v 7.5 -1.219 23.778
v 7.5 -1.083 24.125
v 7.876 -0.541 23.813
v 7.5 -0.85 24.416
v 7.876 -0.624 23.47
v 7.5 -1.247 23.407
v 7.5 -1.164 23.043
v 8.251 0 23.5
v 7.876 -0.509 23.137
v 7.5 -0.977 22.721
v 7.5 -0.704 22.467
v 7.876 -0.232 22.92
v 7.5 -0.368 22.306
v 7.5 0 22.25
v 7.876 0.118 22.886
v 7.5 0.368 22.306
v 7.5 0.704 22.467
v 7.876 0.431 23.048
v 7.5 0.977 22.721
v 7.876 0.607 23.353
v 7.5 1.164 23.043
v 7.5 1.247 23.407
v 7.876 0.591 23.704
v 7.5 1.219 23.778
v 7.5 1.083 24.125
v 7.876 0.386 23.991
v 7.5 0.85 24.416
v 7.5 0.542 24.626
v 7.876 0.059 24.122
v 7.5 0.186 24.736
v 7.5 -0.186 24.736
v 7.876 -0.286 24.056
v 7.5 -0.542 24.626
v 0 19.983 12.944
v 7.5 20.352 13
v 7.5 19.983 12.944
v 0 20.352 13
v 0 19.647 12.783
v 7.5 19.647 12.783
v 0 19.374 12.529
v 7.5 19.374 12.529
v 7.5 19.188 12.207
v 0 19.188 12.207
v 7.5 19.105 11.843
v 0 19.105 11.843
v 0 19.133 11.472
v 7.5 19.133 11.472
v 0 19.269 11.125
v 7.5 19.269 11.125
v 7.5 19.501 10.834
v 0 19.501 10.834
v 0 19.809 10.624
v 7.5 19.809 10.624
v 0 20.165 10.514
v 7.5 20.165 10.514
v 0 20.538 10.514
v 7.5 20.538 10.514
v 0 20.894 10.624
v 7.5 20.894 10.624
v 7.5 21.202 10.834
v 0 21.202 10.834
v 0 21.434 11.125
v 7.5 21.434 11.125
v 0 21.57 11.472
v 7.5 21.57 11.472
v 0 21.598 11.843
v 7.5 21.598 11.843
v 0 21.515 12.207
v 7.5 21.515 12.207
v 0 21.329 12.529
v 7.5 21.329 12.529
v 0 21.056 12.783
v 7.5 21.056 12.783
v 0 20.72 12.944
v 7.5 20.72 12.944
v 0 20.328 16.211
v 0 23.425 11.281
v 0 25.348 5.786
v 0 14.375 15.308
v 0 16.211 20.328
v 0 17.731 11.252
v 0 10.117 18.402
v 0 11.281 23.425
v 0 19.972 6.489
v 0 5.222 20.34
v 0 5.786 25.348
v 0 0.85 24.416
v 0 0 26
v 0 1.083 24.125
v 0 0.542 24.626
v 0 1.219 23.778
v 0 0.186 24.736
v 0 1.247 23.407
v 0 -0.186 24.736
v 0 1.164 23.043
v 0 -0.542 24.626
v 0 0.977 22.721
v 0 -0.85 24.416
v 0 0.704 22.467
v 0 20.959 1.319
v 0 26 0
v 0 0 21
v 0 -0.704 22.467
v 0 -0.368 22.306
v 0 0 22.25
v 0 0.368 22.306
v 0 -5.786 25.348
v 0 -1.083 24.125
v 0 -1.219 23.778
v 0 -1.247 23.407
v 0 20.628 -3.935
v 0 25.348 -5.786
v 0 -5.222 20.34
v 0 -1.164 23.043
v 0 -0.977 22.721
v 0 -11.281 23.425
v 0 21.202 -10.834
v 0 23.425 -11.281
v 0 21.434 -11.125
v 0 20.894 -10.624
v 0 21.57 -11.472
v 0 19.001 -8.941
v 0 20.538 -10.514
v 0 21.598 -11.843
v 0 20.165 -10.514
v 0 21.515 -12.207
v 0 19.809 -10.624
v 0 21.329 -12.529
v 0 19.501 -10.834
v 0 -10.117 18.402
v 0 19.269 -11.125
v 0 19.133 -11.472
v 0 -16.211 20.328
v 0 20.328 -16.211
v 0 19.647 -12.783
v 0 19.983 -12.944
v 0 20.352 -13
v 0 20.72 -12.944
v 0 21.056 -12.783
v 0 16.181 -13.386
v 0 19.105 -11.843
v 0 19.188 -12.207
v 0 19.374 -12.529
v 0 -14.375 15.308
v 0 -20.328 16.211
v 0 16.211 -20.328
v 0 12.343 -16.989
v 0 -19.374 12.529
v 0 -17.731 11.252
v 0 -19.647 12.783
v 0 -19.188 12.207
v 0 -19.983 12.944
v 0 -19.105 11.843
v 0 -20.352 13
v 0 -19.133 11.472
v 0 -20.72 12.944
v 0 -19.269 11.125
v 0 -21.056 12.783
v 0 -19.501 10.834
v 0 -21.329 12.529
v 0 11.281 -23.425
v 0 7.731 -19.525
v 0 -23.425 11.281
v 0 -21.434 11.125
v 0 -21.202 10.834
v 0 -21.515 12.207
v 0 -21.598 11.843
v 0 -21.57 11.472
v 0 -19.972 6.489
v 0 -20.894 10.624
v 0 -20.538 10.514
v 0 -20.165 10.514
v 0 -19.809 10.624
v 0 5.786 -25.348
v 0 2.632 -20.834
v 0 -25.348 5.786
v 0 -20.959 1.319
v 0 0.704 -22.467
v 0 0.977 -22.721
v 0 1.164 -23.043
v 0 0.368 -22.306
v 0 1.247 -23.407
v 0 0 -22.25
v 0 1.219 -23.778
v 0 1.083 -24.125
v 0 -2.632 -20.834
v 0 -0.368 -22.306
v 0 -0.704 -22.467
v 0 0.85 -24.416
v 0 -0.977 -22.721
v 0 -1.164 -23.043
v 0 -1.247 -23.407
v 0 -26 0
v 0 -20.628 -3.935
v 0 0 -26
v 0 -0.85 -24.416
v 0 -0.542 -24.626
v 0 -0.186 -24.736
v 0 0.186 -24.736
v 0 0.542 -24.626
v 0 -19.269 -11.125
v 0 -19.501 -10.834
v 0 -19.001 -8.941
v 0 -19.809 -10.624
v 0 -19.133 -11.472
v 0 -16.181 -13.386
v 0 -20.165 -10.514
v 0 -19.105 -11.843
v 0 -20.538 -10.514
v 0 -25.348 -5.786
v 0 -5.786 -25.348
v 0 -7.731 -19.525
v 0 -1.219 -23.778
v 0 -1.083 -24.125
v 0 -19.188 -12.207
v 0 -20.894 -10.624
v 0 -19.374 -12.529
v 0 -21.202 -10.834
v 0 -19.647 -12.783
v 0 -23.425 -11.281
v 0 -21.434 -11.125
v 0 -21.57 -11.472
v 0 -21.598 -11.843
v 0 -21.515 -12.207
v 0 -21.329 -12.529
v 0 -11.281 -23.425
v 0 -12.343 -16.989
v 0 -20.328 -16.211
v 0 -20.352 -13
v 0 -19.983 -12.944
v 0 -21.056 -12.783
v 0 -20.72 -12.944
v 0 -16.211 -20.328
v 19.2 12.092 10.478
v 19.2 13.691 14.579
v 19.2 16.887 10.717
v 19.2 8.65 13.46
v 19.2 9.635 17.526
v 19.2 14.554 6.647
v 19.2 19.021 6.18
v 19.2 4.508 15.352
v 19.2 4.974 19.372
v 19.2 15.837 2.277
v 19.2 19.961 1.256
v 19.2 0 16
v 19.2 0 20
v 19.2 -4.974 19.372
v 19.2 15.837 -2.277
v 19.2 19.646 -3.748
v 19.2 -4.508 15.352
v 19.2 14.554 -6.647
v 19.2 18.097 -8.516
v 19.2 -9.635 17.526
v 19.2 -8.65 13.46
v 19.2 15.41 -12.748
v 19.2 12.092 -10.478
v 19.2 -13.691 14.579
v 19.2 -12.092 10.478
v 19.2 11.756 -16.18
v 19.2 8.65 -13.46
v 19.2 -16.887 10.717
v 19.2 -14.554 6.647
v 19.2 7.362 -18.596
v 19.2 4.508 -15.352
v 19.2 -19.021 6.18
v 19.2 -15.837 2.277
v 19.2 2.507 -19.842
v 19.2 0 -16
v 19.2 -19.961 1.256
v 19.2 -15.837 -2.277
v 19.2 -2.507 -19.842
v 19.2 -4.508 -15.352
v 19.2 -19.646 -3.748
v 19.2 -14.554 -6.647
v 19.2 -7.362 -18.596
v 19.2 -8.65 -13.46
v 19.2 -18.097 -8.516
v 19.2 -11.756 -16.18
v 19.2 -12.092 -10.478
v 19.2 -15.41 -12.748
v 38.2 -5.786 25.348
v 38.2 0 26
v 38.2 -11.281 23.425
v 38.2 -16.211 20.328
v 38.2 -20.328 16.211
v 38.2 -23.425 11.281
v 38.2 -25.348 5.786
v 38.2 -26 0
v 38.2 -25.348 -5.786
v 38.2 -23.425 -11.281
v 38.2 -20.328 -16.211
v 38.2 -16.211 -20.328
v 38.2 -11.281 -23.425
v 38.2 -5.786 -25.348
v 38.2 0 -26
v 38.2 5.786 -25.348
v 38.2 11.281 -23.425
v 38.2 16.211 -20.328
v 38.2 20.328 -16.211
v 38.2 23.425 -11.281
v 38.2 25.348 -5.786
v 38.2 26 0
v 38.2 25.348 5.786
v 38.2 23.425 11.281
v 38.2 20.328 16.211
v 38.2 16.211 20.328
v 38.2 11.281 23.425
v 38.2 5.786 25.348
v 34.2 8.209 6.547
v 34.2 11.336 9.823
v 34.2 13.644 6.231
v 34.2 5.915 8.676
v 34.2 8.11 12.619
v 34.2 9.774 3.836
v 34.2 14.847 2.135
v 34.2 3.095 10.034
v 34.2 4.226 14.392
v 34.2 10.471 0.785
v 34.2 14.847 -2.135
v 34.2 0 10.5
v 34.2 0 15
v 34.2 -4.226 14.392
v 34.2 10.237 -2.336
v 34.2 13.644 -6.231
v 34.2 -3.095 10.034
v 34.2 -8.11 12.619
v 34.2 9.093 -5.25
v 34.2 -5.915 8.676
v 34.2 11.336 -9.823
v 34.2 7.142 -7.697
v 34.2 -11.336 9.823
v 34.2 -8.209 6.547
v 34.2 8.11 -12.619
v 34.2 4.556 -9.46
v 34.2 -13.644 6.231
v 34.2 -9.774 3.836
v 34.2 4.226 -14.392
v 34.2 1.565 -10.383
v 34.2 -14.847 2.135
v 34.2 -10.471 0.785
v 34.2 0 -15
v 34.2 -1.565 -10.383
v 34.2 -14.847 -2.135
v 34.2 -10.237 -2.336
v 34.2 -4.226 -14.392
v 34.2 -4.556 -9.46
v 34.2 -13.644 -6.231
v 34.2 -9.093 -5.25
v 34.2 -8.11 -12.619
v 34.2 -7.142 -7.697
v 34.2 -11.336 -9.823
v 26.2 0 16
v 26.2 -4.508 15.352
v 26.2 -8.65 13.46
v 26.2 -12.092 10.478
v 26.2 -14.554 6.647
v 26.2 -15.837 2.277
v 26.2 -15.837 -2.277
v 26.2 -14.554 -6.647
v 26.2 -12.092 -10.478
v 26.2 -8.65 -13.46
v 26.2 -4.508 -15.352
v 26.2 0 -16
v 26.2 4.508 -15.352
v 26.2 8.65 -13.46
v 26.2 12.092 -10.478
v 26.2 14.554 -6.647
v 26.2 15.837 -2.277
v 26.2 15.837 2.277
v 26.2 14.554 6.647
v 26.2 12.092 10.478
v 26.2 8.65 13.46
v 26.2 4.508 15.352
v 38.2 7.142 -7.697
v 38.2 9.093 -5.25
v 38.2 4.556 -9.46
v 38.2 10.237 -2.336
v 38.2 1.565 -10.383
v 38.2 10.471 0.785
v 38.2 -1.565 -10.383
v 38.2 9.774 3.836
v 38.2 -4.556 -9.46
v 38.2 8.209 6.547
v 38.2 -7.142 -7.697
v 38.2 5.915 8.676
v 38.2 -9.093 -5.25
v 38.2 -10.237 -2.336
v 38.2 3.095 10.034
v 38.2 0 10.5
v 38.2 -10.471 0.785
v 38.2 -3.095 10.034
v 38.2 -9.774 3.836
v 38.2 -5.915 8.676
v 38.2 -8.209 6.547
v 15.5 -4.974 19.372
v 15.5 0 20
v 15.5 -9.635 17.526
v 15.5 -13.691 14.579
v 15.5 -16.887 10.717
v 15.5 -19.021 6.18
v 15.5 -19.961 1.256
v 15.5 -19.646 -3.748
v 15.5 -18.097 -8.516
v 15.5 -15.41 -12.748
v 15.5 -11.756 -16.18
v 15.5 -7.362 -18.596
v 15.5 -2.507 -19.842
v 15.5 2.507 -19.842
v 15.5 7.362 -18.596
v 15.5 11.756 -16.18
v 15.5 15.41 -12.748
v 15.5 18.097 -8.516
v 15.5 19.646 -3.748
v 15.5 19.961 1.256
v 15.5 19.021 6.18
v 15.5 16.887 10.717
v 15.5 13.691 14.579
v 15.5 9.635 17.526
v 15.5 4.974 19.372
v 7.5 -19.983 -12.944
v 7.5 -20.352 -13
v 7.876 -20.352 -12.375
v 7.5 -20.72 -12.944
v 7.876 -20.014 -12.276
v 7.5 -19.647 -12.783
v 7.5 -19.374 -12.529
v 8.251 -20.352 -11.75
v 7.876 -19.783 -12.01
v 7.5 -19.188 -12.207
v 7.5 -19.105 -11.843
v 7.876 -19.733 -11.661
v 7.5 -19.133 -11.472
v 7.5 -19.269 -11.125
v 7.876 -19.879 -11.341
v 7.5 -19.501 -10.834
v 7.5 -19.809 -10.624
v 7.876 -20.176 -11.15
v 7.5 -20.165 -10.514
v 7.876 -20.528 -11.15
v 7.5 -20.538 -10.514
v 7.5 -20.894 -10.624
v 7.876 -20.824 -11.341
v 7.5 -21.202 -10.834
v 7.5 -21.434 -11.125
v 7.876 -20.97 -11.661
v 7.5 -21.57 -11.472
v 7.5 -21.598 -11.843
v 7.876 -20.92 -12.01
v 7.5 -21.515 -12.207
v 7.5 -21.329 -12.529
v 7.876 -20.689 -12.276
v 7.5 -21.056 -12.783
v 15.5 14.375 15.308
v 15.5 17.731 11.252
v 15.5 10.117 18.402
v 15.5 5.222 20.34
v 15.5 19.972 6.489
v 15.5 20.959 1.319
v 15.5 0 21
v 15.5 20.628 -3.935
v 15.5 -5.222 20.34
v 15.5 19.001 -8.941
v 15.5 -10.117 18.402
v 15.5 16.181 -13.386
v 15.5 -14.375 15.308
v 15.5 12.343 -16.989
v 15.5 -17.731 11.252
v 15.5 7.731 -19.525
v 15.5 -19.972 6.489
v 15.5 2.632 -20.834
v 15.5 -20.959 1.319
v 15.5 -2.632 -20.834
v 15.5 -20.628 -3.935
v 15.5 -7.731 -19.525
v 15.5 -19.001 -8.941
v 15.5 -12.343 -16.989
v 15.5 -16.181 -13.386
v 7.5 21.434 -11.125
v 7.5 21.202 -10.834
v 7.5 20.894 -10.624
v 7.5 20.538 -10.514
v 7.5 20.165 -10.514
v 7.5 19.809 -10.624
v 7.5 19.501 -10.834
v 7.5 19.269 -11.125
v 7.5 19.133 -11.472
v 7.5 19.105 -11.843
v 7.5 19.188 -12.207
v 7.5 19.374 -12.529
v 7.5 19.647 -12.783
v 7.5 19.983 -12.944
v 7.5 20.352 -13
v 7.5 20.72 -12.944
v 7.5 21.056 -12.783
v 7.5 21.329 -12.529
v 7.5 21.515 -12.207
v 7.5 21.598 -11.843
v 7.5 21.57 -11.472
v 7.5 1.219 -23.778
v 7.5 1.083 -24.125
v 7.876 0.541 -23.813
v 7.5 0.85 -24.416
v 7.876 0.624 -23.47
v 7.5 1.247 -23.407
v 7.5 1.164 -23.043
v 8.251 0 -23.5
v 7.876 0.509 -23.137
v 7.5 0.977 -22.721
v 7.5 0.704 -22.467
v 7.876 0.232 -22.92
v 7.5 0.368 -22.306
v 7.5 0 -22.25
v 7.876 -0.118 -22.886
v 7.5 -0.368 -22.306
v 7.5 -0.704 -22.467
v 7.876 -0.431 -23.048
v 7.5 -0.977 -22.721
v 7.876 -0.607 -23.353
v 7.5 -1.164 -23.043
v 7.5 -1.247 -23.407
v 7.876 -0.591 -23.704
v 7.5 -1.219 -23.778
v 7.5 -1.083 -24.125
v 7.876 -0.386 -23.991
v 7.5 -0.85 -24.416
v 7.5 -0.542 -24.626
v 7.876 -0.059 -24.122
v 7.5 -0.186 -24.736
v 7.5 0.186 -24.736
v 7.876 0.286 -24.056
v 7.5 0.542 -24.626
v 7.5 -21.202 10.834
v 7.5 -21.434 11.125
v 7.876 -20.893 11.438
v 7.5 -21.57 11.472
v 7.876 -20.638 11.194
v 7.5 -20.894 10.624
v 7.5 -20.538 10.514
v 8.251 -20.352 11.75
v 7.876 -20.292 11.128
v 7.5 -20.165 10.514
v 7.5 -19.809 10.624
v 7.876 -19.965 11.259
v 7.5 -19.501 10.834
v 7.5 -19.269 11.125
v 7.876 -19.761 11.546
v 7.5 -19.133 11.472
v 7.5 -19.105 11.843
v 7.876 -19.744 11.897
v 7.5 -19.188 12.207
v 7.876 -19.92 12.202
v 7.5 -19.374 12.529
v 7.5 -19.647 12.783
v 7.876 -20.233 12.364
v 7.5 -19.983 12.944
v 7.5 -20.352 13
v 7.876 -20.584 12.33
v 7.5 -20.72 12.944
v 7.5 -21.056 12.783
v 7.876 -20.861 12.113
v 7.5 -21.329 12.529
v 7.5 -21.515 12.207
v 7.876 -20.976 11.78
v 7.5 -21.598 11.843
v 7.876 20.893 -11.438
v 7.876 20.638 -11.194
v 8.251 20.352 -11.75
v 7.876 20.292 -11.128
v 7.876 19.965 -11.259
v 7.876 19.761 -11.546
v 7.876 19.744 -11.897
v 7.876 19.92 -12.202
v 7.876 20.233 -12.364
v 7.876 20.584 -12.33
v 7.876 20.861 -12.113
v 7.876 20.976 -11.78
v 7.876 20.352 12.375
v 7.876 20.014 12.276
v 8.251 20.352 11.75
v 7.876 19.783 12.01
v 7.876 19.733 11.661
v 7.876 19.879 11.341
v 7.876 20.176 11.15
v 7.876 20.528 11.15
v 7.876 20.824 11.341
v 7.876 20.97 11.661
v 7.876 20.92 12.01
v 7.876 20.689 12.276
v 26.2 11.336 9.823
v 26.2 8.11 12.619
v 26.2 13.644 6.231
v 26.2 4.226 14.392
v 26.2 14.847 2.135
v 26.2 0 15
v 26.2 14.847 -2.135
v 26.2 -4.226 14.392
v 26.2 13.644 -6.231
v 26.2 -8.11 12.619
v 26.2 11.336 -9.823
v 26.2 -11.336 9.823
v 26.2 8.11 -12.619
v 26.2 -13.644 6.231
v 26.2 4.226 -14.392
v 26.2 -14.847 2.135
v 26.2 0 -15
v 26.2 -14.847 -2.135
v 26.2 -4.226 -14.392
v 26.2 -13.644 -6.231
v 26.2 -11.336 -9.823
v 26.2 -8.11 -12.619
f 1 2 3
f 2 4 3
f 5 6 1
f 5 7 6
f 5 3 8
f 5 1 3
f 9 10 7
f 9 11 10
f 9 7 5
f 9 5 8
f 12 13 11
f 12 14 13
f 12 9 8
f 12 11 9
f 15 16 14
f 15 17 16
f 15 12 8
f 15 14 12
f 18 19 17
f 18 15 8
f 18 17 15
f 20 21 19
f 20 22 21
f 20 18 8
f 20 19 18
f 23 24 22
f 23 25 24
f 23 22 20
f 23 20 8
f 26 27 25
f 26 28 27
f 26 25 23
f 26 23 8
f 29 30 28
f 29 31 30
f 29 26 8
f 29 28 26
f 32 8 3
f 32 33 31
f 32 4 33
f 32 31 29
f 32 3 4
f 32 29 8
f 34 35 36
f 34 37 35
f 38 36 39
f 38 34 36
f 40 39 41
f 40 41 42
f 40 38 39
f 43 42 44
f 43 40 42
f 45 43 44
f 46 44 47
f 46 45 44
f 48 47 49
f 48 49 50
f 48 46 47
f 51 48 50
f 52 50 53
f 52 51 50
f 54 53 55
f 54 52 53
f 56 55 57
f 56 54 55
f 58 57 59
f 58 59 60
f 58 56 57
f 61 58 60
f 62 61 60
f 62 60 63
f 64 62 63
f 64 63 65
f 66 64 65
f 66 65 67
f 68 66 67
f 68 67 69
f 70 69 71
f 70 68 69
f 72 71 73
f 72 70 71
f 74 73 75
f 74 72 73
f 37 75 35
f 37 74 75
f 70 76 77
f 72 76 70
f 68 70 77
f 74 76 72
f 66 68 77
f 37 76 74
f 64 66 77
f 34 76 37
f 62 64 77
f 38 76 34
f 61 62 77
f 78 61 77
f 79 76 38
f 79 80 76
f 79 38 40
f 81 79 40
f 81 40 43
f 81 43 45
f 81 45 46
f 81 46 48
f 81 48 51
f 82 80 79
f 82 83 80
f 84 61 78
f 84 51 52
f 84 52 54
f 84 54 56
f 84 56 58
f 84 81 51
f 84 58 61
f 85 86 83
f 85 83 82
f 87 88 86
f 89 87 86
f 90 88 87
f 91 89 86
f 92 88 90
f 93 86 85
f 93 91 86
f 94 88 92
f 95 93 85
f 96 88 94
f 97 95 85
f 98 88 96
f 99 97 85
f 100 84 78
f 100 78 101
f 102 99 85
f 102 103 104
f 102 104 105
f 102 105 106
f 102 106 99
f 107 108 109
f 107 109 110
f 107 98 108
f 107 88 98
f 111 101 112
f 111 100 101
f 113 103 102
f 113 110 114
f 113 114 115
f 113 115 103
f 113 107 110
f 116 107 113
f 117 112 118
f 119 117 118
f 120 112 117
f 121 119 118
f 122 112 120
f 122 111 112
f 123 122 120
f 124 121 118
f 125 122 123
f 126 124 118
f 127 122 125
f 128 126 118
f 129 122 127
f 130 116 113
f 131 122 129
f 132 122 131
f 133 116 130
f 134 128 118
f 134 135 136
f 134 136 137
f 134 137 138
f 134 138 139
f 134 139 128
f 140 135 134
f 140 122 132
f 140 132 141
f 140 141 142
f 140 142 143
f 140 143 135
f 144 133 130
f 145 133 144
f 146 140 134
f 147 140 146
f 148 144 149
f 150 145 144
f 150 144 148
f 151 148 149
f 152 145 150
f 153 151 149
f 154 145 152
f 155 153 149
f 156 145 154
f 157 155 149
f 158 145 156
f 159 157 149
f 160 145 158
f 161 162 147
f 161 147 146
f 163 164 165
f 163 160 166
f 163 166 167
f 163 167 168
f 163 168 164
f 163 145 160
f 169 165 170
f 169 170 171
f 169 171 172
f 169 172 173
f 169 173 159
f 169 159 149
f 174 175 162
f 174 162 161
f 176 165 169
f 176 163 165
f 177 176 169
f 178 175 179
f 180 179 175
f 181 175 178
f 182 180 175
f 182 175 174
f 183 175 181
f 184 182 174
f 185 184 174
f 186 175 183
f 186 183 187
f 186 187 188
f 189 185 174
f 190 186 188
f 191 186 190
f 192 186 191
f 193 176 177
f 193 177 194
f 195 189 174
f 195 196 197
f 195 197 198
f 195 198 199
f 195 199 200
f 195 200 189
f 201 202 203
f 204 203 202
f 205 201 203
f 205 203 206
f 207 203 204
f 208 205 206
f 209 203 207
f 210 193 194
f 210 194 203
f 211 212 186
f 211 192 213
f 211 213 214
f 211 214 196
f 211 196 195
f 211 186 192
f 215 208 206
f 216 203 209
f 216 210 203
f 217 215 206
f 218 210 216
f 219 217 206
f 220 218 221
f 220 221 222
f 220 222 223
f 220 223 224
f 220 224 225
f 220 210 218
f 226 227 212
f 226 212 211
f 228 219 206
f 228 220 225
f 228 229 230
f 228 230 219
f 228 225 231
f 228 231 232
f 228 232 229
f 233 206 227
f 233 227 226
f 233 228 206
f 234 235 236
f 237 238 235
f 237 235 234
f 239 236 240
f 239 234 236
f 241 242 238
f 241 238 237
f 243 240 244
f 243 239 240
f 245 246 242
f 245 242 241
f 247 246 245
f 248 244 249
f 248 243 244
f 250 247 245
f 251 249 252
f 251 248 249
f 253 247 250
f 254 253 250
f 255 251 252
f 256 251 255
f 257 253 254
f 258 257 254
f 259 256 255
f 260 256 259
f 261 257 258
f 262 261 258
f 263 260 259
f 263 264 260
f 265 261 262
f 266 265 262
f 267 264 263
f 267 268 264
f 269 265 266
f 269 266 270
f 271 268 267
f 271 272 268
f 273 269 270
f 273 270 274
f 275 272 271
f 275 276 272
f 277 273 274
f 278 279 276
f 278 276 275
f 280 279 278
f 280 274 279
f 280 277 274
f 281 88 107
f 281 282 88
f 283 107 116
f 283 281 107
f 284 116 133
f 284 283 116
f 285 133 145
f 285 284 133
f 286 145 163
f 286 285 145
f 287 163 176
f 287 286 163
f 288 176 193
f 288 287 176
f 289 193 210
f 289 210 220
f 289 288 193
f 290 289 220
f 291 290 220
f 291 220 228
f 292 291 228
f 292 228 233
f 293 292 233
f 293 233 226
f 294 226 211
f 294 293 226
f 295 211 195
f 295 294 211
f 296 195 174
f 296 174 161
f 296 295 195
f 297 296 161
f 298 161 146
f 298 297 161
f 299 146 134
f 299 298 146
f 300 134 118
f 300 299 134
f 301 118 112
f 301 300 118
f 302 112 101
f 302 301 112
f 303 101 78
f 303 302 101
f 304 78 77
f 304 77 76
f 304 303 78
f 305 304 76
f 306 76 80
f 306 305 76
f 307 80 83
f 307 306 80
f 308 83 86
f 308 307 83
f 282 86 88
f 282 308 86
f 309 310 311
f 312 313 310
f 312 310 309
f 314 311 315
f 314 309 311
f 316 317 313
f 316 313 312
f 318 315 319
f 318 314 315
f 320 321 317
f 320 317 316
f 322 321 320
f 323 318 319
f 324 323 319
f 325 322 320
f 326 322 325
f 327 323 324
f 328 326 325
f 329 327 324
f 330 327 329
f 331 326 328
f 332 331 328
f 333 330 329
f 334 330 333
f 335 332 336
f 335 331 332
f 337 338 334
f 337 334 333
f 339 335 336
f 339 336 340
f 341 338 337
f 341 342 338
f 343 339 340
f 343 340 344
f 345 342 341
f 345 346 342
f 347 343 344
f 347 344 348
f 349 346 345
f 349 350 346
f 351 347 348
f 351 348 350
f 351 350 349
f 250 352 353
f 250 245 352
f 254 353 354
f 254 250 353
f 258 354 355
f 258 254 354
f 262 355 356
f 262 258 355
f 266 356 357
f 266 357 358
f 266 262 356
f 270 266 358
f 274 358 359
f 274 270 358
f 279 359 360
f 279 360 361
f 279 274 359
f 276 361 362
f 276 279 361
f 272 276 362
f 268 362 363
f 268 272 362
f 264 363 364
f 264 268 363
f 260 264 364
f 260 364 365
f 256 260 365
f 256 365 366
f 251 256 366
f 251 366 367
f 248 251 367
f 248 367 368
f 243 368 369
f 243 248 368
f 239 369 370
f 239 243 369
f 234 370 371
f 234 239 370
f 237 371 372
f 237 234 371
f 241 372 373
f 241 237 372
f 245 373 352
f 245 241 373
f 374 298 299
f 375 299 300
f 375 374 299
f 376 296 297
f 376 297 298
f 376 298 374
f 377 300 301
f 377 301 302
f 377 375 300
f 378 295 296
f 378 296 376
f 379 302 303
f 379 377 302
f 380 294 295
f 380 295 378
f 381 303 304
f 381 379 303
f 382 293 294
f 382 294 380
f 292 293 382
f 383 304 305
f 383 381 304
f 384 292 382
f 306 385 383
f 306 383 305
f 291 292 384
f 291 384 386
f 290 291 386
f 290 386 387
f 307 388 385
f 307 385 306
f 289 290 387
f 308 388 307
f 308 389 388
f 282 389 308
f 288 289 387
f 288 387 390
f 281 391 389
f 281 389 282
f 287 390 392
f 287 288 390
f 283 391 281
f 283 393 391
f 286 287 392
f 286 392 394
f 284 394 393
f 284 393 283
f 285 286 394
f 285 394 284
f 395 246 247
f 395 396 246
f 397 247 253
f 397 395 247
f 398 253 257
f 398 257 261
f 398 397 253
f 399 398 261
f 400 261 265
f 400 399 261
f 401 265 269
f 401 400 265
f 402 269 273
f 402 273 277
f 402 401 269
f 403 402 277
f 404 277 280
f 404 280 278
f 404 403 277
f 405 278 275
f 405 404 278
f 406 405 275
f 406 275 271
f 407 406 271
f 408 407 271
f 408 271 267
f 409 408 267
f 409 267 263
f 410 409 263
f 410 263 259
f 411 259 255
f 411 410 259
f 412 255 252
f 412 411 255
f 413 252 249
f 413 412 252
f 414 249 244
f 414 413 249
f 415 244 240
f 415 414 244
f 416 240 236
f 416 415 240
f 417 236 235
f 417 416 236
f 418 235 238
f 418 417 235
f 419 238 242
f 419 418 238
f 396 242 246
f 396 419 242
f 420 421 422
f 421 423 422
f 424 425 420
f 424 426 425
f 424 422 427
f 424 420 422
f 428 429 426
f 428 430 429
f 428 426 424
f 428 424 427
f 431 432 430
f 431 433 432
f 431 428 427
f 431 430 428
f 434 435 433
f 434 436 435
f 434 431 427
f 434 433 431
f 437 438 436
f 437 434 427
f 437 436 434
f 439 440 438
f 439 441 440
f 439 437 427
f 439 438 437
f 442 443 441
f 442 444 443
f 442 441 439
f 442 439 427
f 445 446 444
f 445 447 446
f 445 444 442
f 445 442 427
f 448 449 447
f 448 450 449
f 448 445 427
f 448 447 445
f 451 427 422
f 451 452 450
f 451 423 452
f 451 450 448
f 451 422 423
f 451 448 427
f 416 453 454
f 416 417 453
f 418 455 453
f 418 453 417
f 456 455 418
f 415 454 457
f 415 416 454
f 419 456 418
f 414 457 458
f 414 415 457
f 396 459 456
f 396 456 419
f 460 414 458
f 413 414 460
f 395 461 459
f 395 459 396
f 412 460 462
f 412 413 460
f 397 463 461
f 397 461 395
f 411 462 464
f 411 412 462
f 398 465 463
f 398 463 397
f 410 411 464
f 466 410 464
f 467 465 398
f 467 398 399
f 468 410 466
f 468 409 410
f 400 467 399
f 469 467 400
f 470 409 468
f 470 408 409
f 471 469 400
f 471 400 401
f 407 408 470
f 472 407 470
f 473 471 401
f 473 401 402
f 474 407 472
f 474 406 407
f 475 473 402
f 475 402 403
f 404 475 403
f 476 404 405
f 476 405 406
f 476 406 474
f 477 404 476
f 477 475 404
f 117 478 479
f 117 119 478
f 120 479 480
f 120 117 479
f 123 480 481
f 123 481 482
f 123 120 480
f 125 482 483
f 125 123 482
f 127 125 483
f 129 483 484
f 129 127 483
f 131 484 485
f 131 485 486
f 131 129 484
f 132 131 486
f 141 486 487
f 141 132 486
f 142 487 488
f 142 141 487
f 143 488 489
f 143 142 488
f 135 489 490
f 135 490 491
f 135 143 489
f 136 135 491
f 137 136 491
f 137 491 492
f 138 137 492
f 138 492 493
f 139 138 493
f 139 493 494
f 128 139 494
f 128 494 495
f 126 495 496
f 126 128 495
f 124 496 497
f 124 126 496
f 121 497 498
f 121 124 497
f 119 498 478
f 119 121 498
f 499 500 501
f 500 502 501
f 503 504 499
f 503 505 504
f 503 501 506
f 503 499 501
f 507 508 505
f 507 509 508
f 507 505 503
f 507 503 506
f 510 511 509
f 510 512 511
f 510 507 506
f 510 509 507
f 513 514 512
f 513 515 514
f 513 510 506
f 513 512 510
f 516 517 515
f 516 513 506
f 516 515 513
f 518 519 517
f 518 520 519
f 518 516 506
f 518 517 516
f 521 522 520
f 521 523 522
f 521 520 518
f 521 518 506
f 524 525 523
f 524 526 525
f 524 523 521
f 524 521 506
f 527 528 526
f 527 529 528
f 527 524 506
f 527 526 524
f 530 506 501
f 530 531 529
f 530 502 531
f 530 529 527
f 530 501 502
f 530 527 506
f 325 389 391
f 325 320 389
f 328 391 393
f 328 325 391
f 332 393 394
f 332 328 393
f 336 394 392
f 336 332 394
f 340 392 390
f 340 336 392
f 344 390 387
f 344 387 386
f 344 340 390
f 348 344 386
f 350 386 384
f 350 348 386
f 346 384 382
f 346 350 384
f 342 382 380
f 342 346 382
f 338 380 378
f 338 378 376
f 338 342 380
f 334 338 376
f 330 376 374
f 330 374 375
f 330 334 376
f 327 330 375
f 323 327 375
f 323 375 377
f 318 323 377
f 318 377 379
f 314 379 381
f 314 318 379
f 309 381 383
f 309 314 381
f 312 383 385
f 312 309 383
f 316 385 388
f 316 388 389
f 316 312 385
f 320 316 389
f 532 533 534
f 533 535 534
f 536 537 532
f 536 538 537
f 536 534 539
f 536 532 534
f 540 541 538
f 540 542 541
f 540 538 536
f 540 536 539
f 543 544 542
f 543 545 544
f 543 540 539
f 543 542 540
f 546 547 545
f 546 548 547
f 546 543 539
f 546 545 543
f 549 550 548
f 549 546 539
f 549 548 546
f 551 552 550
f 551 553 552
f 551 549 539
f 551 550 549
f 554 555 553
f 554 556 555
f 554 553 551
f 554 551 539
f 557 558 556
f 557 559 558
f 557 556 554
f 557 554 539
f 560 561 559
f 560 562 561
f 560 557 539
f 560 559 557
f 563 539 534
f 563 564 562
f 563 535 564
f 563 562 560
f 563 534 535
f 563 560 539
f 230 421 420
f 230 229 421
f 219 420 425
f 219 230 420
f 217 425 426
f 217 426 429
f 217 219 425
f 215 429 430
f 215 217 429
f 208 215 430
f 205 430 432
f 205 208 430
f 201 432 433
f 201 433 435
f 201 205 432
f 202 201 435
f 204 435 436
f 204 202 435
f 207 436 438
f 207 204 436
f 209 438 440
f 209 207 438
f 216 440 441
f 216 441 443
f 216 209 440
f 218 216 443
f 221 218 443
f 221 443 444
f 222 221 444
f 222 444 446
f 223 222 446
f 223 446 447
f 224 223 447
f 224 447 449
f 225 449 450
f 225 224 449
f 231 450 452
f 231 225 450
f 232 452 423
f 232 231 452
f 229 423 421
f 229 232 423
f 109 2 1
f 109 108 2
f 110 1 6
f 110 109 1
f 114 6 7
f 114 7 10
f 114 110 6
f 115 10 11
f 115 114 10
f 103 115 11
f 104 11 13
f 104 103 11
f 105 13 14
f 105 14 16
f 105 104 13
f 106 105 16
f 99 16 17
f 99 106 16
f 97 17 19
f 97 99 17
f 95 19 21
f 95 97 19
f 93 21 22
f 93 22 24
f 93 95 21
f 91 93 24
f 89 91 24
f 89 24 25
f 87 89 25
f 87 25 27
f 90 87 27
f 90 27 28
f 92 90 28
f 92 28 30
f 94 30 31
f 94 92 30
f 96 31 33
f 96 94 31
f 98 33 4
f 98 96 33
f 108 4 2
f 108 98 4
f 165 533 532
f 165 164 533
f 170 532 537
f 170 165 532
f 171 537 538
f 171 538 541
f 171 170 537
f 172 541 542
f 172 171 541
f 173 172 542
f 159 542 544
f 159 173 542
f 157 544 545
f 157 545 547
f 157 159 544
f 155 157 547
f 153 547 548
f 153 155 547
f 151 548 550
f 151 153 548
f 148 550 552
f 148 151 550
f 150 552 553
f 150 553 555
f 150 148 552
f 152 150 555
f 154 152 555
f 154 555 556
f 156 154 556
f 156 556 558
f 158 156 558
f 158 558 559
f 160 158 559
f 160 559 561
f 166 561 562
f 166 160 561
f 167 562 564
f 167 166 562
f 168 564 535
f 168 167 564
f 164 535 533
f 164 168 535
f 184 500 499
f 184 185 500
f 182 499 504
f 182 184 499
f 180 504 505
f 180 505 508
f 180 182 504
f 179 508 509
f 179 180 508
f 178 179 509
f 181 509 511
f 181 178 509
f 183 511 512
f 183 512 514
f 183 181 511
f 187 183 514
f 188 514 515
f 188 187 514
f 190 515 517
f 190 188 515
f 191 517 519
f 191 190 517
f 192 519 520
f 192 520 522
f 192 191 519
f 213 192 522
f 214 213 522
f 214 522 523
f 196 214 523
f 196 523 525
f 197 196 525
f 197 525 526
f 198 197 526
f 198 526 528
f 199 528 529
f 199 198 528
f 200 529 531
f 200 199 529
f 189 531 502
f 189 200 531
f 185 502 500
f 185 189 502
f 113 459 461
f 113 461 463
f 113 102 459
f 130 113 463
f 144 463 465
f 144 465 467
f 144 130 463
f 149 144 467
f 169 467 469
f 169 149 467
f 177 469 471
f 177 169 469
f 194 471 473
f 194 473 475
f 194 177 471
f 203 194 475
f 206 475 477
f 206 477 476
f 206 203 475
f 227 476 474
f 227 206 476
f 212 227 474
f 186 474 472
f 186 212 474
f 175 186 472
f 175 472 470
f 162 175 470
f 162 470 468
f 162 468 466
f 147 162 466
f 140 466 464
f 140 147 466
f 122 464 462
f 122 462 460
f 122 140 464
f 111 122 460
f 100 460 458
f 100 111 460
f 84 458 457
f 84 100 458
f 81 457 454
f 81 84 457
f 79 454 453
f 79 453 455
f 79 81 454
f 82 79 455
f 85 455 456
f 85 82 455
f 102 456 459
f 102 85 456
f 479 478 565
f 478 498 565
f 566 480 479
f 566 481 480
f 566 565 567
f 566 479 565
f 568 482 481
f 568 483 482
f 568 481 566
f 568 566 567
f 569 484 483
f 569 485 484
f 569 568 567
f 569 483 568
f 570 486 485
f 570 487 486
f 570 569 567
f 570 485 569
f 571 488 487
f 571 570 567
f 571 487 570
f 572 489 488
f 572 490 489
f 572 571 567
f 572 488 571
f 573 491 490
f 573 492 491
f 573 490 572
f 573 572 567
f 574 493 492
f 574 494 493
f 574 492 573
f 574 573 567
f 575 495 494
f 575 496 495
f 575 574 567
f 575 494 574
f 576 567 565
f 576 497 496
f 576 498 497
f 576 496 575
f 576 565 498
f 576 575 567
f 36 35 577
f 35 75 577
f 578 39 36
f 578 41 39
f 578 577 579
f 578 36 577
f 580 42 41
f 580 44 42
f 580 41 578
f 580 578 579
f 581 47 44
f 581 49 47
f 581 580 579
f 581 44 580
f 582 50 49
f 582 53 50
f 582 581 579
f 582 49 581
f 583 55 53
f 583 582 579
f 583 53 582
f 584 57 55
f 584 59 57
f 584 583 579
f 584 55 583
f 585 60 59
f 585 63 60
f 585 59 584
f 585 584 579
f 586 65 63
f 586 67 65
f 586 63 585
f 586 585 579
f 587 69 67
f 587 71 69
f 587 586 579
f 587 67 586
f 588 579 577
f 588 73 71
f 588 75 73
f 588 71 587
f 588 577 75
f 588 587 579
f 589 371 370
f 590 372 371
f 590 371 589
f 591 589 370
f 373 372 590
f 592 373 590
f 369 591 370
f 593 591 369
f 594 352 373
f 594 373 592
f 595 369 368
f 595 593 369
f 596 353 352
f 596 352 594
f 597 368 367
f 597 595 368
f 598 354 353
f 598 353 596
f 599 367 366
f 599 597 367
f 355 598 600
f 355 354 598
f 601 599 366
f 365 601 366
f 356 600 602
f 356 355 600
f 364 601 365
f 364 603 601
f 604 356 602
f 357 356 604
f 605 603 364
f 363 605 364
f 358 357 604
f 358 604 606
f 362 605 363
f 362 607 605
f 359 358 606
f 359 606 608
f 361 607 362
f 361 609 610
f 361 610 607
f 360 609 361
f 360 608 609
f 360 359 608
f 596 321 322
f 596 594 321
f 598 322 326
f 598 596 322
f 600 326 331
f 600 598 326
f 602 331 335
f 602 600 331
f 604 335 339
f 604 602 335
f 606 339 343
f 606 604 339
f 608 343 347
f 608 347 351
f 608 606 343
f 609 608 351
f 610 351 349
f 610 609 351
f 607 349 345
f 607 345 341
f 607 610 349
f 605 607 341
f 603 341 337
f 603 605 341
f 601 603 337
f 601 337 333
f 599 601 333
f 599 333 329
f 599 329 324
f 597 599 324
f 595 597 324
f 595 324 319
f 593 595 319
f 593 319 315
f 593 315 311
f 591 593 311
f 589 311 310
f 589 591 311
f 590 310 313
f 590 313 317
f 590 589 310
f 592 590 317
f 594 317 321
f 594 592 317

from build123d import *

# Parameters (mm, degrees)
CIRPATTERN1_COUNT = 6


with BuildPart() as part:
    # Sketch1 → Revolve1 (revolve)
    with BuildSketch(Plane.XY):
        Polygon((0, 26), (0, 21), (15.5, 21), (15.5, 20), (19.2, 20), (19.2, 16), (26.2, 16), (26.2, 15), (34.2, 15), (34.2, 10.5), (38.2, 10.5), (38.2, 26), align=None)
    revolve(axis=Axis((-4.437766072, 0, 0), (1, 0, 0)))

    # Sketch3 → M3 Tapped Hole1 (revolve, cut)
    with BuildSketch(Plane(origin=(0, 20.351596989, 11.75), x_dir=(0, 0, 1), z_dir=(0, 1, 0))):
        Polygon((0, 0), (0, 8.251075774), (1.25, 7.5), (1.25, 0), align=None)
    m3_tapped_hole1 = revolve(axis=Axis((-6.35, 20.351596989, 11.75), (1, 0, 0)), mode=Mode.SUBTRACT)

    # CirPattern1: M3 Tapped Hole1 ×6 about axis
    cirpattern1_axis = Axis((-4.437766072, 0, 0), (1, 0, 0))
    for i in range(1, CIRPATTERN1_COUNT):
        add(m3_tapped_hole1.rotate(cirpattern1_axis, i * 360 / CIRPATTERN1_COUNT), mode=Mode.SUBTRACT)


solid = part.part
